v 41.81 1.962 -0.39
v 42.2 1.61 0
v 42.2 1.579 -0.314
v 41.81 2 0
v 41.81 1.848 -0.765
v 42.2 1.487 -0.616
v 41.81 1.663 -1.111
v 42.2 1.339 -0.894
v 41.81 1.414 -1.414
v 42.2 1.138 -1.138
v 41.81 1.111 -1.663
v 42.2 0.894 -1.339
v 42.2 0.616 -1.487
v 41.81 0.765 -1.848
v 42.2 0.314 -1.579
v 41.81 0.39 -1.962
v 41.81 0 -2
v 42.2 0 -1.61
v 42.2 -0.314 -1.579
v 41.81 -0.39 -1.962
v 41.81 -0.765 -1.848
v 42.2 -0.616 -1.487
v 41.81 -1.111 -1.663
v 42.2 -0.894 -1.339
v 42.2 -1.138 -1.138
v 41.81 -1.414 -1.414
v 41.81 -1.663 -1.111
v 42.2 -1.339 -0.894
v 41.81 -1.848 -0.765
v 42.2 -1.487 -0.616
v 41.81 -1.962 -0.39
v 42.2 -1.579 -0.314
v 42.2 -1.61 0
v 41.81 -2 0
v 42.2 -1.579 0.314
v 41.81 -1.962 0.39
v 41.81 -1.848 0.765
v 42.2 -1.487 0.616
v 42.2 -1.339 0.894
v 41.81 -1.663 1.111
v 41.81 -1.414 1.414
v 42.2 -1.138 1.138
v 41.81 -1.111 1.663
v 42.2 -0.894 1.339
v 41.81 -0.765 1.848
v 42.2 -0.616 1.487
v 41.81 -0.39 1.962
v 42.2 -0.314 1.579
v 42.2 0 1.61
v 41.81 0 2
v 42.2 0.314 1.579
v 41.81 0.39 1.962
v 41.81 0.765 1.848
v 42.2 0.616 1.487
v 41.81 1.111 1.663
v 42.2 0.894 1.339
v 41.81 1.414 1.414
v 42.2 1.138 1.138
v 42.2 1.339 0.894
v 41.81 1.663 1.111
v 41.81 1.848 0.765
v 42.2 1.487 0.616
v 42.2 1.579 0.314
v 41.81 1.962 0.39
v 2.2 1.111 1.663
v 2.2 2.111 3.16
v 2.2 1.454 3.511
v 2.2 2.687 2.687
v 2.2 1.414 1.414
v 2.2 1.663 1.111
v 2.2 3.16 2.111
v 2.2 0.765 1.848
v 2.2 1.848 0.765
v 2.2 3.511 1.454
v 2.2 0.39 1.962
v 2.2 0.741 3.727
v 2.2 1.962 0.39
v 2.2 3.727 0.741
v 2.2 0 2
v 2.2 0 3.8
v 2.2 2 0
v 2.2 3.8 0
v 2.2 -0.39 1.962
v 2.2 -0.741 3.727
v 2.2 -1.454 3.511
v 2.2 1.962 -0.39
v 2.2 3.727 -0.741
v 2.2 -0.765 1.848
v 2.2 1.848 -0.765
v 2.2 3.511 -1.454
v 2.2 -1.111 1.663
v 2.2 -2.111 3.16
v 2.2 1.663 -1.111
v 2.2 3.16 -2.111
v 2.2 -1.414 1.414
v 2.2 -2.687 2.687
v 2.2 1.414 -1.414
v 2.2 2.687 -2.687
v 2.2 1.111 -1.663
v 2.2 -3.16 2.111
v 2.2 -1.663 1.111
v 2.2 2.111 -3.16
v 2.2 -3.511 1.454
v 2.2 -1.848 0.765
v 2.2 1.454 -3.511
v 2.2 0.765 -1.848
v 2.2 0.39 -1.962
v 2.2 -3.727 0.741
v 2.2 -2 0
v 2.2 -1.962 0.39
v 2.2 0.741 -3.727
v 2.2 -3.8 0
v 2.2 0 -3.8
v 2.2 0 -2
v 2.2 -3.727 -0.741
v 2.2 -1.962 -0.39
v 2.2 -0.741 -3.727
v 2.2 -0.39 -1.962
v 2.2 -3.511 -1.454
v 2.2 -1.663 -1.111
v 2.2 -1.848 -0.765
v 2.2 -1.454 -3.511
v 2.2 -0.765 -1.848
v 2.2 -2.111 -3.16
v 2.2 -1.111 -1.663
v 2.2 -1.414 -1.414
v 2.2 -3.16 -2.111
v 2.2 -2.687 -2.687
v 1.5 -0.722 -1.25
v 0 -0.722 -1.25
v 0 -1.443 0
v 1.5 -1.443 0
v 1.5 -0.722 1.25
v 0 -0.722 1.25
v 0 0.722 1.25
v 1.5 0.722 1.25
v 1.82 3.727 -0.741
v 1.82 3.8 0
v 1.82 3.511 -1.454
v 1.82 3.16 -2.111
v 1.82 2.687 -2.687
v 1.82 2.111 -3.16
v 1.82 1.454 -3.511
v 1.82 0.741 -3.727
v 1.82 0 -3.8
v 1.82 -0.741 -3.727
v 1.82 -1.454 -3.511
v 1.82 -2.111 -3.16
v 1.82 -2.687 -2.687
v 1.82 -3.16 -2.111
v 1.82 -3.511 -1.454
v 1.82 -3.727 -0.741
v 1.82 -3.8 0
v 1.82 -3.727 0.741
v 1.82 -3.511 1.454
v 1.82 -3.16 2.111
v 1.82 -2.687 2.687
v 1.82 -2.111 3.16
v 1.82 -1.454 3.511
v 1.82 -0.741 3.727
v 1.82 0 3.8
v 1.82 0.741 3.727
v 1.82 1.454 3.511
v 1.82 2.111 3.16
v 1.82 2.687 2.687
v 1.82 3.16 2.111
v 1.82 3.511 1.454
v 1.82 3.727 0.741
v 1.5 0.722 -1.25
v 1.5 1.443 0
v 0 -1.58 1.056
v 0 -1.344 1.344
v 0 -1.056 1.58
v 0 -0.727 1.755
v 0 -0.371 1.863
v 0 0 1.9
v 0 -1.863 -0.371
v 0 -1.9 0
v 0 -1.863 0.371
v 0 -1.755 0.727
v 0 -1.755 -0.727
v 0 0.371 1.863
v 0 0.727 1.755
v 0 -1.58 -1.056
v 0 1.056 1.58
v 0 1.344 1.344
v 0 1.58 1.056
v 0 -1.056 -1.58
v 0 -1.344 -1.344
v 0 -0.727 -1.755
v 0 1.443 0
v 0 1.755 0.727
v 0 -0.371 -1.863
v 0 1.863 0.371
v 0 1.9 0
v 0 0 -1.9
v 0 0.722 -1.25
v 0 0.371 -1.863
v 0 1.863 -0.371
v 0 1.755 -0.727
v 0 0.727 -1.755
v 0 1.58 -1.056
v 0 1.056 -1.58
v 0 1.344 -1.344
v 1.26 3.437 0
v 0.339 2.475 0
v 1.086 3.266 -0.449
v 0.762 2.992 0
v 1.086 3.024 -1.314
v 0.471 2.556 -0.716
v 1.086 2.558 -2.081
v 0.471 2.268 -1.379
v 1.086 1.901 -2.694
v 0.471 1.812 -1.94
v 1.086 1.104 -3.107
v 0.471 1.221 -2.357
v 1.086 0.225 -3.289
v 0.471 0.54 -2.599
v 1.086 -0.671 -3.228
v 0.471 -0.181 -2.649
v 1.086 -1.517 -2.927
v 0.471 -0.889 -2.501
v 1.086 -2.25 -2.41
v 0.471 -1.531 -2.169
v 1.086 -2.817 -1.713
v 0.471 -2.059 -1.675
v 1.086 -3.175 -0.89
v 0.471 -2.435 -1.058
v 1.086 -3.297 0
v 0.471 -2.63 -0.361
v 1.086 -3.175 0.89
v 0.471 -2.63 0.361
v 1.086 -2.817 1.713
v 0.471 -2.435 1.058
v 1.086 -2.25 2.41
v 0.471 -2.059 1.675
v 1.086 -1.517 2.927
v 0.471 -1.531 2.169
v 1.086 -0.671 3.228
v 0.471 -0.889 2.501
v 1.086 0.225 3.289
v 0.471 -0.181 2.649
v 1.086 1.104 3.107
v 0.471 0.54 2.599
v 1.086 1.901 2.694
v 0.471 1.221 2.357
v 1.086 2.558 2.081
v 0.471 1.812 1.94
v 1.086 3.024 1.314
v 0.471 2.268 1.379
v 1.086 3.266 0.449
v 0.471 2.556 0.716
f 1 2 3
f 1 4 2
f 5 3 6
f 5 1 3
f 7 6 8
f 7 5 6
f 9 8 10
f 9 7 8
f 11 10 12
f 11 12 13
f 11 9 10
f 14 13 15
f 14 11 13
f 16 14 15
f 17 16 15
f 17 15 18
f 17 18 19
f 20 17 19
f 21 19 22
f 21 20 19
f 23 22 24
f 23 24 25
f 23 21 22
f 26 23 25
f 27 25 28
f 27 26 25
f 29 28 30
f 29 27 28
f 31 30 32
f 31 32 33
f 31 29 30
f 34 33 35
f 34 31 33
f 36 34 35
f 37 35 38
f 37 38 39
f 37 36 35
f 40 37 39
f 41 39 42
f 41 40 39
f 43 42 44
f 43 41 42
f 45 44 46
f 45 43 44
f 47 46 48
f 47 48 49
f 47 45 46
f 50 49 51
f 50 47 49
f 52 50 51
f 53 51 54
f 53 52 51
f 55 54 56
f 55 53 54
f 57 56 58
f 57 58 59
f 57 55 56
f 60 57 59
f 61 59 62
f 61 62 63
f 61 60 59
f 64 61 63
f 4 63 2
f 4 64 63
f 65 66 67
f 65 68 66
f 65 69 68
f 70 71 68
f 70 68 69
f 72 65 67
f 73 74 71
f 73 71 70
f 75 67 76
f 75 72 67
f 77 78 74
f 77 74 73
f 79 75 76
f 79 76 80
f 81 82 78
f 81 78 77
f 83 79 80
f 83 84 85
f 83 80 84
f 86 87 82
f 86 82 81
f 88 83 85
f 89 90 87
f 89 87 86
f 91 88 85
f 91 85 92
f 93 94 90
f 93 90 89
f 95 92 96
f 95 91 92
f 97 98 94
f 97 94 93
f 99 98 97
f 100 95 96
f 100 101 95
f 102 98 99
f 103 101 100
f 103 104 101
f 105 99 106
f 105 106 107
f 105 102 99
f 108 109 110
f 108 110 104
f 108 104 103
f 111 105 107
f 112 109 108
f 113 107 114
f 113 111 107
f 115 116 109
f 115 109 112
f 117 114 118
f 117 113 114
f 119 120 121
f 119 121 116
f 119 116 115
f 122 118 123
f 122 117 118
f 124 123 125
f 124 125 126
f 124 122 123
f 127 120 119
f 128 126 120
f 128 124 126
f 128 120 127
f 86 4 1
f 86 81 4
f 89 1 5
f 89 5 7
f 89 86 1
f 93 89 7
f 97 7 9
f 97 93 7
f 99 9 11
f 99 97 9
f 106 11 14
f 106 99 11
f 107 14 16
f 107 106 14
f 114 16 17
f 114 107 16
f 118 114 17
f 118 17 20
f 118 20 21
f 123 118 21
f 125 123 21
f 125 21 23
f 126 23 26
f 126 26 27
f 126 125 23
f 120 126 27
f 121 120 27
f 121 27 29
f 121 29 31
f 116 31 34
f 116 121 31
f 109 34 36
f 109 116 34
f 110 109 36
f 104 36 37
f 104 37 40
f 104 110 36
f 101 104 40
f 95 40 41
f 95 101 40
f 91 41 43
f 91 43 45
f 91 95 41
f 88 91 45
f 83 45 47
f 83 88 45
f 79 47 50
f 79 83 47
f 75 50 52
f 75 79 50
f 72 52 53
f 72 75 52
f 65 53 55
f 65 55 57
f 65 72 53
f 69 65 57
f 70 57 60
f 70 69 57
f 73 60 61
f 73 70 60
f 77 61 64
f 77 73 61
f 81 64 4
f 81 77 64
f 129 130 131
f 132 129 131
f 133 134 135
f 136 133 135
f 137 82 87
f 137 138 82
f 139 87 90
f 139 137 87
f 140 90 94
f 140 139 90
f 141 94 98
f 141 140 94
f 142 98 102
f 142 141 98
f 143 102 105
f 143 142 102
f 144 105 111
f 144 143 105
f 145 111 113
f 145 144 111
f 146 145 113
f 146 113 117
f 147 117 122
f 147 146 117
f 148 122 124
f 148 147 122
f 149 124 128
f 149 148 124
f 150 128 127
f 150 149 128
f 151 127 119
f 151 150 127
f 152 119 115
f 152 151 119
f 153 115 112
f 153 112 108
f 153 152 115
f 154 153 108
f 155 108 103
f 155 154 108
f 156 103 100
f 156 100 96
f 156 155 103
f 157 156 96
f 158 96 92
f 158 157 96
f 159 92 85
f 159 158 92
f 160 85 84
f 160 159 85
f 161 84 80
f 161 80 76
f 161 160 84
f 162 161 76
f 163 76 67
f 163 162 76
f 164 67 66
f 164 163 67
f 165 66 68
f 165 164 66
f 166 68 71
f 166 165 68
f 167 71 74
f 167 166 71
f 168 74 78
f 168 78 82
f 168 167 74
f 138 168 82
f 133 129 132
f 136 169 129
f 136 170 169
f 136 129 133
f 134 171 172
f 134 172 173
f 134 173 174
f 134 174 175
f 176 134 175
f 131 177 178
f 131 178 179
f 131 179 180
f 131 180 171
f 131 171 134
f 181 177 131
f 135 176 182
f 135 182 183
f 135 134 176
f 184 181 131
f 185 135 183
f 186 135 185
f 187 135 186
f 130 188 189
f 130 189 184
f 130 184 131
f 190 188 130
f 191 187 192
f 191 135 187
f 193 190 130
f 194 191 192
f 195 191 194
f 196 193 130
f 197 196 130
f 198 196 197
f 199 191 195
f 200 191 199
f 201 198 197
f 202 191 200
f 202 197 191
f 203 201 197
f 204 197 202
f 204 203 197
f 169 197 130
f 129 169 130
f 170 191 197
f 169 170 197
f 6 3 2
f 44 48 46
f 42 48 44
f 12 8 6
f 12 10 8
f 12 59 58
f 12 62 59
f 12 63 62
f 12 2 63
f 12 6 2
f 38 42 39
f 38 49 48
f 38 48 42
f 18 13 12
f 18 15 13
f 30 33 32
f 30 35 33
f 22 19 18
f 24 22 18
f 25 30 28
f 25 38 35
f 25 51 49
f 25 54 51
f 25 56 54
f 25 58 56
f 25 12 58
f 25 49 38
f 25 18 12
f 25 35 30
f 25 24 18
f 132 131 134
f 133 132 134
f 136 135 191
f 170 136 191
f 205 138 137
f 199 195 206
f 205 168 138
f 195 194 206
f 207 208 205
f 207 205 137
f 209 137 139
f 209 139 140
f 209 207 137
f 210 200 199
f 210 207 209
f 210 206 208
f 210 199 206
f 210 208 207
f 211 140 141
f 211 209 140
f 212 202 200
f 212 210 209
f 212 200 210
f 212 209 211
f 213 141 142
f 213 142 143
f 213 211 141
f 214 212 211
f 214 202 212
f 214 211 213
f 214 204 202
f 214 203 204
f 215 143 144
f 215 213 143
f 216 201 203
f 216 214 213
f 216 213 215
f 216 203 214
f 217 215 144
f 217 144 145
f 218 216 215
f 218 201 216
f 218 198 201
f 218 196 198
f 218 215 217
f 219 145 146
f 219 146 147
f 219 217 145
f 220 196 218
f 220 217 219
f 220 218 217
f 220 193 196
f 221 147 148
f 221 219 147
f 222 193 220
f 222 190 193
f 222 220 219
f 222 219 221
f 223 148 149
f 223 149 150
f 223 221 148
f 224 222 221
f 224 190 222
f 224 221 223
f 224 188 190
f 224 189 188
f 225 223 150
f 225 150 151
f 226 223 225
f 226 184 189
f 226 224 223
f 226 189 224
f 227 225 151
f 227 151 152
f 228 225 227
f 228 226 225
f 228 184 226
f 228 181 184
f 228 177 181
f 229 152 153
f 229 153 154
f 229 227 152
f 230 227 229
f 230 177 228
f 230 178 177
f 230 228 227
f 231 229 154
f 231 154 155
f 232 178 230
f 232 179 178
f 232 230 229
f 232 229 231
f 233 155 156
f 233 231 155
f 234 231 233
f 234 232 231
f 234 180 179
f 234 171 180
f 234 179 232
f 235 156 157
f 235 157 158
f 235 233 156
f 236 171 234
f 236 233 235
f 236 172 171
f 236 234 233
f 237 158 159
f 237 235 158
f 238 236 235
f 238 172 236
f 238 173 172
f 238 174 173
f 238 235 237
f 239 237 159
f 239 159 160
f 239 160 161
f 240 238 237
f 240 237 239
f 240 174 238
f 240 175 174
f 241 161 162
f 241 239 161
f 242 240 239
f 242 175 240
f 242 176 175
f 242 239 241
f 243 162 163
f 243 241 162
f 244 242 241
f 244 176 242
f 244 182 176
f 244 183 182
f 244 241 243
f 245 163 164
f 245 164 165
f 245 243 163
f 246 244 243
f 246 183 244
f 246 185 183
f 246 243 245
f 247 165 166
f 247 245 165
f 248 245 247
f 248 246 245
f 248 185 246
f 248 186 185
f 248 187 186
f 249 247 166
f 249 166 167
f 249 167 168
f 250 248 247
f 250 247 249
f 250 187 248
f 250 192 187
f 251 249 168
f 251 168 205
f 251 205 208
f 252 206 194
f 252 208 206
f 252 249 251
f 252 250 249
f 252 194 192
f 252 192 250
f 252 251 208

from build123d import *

# Parameters (mm, degrees)
CUT_EXTRUDE1_DEPTH = 1.5


with BuildPart() as part:
    # Sketch1 → Revolve1 (revolve)
    with BuildSketch(Plane.XY):
        with BuildLine():
            Line((42.2, 0), (42.2, 1.61))
            Line((42.2, 1.61), (41.81, 2))
            Line((41.81, 2), (2.2, 2))
            Line((2.2, 2), (2.2, 3.8))
            Line((2.2, 3.8), (1.82, 3.8))
            ThreePointArc((1.82, 3.8), (0.762013659, 2.991755338), (0, 1.9))
            Line((0, 1.9), (0, 0))
            Line((0, 0), (42.2, 0))
        make_face()
    revolve(axis=Axis((42.2, 0, 0), (-1, 0, 0)))

    # Sketch2 → Cut-Extrude1 (cut)
    with BuildSketch(Plane.ZY):
        Polygon((-1.25, 0.721687836), (-1.25, -0.721687836), (0, -1.443375673), (1.25, -0.721687836), (1.25, 0.721687836), (0, 1.443375673), align=None)
    extrude(amount=-CUT_EXTRUDE1_DEPTH, mode=Mode.SUBTRACT)


solid = part.part
